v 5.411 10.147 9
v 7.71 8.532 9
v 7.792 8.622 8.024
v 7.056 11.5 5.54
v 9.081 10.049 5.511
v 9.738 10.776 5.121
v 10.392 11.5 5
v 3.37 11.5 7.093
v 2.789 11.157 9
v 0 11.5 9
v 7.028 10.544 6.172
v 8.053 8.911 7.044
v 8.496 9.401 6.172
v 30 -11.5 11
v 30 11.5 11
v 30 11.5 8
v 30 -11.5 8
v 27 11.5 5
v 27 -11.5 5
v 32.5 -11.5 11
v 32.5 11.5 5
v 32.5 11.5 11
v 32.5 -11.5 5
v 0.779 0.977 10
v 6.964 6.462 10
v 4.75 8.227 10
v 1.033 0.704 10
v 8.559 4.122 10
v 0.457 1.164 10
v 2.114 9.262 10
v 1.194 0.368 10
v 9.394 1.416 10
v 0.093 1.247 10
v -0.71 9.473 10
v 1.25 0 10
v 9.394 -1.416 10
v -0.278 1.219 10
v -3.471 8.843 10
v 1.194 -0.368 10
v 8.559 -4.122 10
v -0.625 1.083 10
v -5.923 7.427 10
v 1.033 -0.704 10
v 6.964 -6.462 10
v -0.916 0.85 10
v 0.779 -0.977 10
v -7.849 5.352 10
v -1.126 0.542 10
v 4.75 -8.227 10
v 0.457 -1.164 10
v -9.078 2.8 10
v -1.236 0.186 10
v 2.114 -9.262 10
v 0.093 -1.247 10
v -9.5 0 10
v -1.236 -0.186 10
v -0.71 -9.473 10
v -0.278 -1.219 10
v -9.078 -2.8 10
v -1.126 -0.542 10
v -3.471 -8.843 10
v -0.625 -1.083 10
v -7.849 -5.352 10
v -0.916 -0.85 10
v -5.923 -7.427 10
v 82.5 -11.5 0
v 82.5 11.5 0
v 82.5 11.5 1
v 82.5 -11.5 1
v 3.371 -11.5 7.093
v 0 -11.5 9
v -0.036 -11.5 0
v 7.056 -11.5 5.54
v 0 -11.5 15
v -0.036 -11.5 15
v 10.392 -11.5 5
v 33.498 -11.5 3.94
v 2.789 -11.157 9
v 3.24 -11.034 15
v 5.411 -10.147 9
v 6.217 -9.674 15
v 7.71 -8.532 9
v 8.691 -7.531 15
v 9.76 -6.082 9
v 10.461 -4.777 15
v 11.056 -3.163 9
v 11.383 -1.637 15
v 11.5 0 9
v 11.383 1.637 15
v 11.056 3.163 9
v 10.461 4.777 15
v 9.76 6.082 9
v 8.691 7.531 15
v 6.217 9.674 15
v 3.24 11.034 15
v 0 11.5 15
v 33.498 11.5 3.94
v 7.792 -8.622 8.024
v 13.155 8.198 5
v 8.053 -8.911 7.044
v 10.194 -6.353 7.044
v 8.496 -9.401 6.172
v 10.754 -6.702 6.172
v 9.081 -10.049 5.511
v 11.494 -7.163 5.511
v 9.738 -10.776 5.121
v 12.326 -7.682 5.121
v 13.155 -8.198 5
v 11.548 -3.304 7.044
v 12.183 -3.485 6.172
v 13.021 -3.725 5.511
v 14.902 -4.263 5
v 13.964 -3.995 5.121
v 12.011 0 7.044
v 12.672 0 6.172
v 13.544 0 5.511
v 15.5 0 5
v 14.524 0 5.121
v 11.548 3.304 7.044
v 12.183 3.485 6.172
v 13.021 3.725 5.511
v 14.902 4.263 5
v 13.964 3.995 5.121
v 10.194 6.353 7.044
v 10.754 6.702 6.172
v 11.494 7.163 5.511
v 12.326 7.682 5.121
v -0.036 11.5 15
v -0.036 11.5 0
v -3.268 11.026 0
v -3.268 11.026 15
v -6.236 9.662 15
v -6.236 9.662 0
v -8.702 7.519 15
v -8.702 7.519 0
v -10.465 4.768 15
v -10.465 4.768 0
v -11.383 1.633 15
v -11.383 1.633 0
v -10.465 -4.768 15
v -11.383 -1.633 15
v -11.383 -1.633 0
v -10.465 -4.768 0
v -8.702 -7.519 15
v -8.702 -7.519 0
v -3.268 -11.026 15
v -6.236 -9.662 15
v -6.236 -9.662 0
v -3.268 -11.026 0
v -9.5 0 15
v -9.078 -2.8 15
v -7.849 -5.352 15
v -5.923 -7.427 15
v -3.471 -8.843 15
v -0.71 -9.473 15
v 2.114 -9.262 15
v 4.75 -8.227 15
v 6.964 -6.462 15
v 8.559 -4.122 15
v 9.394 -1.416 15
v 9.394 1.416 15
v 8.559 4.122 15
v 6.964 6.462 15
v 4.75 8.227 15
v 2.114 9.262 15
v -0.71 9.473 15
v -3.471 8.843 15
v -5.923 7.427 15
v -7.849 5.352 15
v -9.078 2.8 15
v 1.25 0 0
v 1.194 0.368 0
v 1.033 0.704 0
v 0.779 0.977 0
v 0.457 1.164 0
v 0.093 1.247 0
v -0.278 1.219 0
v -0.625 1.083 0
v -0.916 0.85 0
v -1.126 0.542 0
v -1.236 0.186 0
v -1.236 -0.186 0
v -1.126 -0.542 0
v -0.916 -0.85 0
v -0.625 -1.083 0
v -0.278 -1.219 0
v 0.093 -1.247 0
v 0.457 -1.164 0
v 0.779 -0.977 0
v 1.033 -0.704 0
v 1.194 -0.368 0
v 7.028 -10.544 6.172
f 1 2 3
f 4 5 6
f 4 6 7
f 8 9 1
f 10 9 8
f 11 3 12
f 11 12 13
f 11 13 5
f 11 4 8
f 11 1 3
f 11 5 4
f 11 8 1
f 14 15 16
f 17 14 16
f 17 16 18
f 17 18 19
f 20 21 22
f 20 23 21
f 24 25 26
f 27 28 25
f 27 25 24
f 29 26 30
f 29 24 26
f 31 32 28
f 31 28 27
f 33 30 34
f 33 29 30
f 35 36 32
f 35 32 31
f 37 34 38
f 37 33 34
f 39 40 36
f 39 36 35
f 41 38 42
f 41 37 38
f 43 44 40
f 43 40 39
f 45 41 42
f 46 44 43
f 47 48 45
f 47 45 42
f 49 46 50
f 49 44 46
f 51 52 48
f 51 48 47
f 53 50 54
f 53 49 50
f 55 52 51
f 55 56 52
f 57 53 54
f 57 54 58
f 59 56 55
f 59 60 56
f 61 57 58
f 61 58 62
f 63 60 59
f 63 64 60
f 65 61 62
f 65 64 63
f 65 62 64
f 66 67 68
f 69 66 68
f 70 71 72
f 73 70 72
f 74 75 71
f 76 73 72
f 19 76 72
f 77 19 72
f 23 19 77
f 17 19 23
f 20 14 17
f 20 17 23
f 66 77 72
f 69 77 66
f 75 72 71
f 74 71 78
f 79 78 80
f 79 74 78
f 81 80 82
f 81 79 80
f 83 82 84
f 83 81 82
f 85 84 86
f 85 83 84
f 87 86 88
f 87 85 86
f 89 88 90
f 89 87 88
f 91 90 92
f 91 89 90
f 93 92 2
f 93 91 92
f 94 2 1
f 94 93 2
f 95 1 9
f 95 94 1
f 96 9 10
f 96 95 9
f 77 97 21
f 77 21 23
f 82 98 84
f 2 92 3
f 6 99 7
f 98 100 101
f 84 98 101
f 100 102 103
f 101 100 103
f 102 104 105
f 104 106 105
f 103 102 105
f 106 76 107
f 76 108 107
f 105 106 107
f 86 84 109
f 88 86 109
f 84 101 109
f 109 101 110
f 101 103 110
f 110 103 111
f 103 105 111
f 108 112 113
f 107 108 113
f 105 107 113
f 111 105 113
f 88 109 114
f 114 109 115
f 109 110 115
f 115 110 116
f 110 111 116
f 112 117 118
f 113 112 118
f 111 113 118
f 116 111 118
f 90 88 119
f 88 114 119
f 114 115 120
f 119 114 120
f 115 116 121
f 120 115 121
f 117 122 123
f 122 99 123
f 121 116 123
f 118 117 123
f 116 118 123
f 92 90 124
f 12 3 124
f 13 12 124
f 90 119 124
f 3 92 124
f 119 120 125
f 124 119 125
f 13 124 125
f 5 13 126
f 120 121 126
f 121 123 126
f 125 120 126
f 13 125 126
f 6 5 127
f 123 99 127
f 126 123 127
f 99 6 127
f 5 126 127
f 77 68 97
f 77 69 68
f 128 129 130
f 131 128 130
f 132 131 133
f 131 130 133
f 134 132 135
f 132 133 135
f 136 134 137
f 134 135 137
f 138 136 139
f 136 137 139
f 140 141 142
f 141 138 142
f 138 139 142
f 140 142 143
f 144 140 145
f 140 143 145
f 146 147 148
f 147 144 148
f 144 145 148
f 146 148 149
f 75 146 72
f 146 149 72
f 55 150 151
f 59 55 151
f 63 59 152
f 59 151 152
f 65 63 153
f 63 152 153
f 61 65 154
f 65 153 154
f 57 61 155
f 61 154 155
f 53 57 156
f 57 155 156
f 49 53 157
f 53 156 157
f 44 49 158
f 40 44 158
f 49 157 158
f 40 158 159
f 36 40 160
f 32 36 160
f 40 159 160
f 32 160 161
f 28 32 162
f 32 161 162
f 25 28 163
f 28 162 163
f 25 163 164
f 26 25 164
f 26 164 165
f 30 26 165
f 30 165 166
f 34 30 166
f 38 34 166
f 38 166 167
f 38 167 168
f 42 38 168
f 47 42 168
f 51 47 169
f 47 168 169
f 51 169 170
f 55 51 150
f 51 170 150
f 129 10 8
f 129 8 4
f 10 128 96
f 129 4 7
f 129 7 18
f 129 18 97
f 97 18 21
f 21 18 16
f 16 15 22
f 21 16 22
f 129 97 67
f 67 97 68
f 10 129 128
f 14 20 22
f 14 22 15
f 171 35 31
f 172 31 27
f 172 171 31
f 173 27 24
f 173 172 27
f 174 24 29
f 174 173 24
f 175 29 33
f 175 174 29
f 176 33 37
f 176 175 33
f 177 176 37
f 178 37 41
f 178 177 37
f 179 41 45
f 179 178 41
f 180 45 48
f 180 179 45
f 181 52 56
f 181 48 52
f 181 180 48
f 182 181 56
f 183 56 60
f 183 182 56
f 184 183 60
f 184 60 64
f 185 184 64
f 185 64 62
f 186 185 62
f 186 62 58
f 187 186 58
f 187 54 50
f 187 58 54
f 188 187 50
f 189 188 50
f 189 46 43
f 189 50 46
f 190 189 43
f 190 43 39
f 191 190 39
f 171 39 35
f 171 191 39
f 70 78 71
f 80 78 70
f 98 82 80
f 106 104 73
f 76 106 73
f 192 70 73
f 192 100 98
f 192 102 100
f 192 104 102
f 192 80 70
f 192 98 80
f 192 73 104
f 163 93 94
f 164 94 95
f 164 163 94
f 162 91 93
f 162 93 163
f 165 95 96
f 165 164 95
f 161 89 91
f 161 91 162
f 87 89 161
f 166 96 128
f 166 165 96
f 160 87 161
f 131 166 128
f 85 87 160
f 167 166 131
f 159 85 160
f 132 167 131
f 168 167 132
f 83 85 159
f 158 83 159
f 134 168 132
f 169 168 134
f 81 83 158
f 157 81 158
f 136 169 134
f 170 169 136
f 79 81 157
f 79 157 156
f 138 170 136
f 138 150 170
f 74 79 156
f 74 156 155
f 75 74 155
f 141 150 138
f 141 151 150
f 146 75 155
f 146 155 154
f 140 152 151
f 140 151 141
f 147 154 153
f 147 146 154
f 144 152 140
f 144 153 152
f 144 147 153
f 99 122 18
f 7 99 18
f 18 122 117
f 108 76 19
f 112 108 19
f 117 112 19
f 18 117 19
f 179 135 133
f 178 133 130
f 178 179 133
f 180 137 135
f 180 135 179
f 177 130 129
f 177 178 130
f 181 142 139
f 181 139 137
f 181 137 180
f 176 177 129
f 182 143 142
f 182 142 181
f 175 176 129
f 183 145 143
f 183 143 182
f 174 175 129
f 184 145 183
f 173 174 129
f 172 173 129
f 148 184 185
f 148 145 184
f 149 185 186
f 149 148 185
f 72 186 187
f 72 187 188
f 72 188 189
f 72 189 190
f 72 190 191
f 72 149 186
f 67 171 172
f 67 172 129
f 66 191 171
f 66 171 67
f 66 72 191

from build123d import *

# Parameters (mm, degrees)
PAD_DEPTH       = 11.5
POCKET_DEPTH    = 15
SKETCH003_R     = 9.5
POCKET001_DEPTH = 5
POCKET002_DEPTH = 10
FILLET_R        = 4
CHAMFER_SIZE    = 3
CHAMFER001_SIZE = 1
SKETCH006_R     = 1.25
POCKET003_DEPTH = 30


with BuildPart() as part:
    # Sketch → Pad (new body, symmetric)
    with BuildSketch(Plane.XZ):
        Polygon((-11.5, 0), (82.5, 0), (82.5, 1), (32.5, 4), (32.5, 11), (30, 11), (30, 5), (11.5, 5), (11.5, 15), (-11.5, 15), align=None)
    extrude(amount=PAD_DEPTH, both=True)

    # Sketch001 → Pocket (cut)
    with BuildSketch(Plane.XY):
        with BuildLine():
            ThreePointArc((-0.035747, 11.499944), (-11.5, 0), (-0.035747, -11.499944))
            Line((-0.035747, -11.499944), (-0.035747, -22.999972))
            ThreePointArc((-0.035747, 22.999972), (-23, 0), (-0.035747, -22.999972))
            Line((-0.035747, 22.999972), (-0.035747, 11.499944))
        make_face()
    extrude(amount=POCKET_DEPTH, mode=Mode.SUBTRACT)

    # Sketch003 (on DatumPlane) → Pocket001 (cut)
    with BuildSketch(Plane(origin=(0, 0, 15), x_dir=(-1, 0, 0), z_dir=(0, 0, 1))):
        Circle(SKETCH003_R)
    extrude(amount=-POCKET001_DEPTH, mode=Mode.SUBTRACT)

    # Sketch005 (on Face1 of Pocket001) → Pocket002 (cut)
    with BuildSketch(Plane(origin=(0, 0, 15), x_dir=(-1, 0, 0), z_dir=(0, 0, 1))):
        with BuildLine():
            ThreePointArc((0, 11.5), (-11.5, 0), (0, -11.5))
            Line((0, -11.5), (0, -23))
            ThreePointArc((0, 23), (-23, 0), (0, -23))
            Line((0, 23), (0, 11.5))
        make_face()
    extrude(amount=-POCKET002_DEPTH, mode=Mode.SUBTRACT)

    # Fillet
    fillet_edges = [part.edges().sort_by_distance(p)[0] for p in [
        (8.131728, -8.131728, 5),
        (8.131728, 8.131728, 5),
    ]]
    fillet(fillet_edges, radius=FILLET_R)

    # Chamfer
    chamfer_edges = [part.edges().sort_by_distance(p)[0] for p in [
        (30, 0, 5),
    ]]
    chamfer(chamfer_edges, length=CHAMFER_SIZE)

    # Chamfer001
    chamfer001_edges = [part.edges().sort_by_distance(p)[0] for p in [
        (32.5, 0, 4),
    ]]
    chamfer(chamfer001_edges, length=CHAMFER001_SIZE)

    # Sketch006 → Pocket003 (cut)
    with BuildSketch(Plane.XY):
        Circle(SKETCH006_R)
    extrude(amount=POCKET003_DEPTH, mode=Mode.SUBTRACT)


solid = part.part
